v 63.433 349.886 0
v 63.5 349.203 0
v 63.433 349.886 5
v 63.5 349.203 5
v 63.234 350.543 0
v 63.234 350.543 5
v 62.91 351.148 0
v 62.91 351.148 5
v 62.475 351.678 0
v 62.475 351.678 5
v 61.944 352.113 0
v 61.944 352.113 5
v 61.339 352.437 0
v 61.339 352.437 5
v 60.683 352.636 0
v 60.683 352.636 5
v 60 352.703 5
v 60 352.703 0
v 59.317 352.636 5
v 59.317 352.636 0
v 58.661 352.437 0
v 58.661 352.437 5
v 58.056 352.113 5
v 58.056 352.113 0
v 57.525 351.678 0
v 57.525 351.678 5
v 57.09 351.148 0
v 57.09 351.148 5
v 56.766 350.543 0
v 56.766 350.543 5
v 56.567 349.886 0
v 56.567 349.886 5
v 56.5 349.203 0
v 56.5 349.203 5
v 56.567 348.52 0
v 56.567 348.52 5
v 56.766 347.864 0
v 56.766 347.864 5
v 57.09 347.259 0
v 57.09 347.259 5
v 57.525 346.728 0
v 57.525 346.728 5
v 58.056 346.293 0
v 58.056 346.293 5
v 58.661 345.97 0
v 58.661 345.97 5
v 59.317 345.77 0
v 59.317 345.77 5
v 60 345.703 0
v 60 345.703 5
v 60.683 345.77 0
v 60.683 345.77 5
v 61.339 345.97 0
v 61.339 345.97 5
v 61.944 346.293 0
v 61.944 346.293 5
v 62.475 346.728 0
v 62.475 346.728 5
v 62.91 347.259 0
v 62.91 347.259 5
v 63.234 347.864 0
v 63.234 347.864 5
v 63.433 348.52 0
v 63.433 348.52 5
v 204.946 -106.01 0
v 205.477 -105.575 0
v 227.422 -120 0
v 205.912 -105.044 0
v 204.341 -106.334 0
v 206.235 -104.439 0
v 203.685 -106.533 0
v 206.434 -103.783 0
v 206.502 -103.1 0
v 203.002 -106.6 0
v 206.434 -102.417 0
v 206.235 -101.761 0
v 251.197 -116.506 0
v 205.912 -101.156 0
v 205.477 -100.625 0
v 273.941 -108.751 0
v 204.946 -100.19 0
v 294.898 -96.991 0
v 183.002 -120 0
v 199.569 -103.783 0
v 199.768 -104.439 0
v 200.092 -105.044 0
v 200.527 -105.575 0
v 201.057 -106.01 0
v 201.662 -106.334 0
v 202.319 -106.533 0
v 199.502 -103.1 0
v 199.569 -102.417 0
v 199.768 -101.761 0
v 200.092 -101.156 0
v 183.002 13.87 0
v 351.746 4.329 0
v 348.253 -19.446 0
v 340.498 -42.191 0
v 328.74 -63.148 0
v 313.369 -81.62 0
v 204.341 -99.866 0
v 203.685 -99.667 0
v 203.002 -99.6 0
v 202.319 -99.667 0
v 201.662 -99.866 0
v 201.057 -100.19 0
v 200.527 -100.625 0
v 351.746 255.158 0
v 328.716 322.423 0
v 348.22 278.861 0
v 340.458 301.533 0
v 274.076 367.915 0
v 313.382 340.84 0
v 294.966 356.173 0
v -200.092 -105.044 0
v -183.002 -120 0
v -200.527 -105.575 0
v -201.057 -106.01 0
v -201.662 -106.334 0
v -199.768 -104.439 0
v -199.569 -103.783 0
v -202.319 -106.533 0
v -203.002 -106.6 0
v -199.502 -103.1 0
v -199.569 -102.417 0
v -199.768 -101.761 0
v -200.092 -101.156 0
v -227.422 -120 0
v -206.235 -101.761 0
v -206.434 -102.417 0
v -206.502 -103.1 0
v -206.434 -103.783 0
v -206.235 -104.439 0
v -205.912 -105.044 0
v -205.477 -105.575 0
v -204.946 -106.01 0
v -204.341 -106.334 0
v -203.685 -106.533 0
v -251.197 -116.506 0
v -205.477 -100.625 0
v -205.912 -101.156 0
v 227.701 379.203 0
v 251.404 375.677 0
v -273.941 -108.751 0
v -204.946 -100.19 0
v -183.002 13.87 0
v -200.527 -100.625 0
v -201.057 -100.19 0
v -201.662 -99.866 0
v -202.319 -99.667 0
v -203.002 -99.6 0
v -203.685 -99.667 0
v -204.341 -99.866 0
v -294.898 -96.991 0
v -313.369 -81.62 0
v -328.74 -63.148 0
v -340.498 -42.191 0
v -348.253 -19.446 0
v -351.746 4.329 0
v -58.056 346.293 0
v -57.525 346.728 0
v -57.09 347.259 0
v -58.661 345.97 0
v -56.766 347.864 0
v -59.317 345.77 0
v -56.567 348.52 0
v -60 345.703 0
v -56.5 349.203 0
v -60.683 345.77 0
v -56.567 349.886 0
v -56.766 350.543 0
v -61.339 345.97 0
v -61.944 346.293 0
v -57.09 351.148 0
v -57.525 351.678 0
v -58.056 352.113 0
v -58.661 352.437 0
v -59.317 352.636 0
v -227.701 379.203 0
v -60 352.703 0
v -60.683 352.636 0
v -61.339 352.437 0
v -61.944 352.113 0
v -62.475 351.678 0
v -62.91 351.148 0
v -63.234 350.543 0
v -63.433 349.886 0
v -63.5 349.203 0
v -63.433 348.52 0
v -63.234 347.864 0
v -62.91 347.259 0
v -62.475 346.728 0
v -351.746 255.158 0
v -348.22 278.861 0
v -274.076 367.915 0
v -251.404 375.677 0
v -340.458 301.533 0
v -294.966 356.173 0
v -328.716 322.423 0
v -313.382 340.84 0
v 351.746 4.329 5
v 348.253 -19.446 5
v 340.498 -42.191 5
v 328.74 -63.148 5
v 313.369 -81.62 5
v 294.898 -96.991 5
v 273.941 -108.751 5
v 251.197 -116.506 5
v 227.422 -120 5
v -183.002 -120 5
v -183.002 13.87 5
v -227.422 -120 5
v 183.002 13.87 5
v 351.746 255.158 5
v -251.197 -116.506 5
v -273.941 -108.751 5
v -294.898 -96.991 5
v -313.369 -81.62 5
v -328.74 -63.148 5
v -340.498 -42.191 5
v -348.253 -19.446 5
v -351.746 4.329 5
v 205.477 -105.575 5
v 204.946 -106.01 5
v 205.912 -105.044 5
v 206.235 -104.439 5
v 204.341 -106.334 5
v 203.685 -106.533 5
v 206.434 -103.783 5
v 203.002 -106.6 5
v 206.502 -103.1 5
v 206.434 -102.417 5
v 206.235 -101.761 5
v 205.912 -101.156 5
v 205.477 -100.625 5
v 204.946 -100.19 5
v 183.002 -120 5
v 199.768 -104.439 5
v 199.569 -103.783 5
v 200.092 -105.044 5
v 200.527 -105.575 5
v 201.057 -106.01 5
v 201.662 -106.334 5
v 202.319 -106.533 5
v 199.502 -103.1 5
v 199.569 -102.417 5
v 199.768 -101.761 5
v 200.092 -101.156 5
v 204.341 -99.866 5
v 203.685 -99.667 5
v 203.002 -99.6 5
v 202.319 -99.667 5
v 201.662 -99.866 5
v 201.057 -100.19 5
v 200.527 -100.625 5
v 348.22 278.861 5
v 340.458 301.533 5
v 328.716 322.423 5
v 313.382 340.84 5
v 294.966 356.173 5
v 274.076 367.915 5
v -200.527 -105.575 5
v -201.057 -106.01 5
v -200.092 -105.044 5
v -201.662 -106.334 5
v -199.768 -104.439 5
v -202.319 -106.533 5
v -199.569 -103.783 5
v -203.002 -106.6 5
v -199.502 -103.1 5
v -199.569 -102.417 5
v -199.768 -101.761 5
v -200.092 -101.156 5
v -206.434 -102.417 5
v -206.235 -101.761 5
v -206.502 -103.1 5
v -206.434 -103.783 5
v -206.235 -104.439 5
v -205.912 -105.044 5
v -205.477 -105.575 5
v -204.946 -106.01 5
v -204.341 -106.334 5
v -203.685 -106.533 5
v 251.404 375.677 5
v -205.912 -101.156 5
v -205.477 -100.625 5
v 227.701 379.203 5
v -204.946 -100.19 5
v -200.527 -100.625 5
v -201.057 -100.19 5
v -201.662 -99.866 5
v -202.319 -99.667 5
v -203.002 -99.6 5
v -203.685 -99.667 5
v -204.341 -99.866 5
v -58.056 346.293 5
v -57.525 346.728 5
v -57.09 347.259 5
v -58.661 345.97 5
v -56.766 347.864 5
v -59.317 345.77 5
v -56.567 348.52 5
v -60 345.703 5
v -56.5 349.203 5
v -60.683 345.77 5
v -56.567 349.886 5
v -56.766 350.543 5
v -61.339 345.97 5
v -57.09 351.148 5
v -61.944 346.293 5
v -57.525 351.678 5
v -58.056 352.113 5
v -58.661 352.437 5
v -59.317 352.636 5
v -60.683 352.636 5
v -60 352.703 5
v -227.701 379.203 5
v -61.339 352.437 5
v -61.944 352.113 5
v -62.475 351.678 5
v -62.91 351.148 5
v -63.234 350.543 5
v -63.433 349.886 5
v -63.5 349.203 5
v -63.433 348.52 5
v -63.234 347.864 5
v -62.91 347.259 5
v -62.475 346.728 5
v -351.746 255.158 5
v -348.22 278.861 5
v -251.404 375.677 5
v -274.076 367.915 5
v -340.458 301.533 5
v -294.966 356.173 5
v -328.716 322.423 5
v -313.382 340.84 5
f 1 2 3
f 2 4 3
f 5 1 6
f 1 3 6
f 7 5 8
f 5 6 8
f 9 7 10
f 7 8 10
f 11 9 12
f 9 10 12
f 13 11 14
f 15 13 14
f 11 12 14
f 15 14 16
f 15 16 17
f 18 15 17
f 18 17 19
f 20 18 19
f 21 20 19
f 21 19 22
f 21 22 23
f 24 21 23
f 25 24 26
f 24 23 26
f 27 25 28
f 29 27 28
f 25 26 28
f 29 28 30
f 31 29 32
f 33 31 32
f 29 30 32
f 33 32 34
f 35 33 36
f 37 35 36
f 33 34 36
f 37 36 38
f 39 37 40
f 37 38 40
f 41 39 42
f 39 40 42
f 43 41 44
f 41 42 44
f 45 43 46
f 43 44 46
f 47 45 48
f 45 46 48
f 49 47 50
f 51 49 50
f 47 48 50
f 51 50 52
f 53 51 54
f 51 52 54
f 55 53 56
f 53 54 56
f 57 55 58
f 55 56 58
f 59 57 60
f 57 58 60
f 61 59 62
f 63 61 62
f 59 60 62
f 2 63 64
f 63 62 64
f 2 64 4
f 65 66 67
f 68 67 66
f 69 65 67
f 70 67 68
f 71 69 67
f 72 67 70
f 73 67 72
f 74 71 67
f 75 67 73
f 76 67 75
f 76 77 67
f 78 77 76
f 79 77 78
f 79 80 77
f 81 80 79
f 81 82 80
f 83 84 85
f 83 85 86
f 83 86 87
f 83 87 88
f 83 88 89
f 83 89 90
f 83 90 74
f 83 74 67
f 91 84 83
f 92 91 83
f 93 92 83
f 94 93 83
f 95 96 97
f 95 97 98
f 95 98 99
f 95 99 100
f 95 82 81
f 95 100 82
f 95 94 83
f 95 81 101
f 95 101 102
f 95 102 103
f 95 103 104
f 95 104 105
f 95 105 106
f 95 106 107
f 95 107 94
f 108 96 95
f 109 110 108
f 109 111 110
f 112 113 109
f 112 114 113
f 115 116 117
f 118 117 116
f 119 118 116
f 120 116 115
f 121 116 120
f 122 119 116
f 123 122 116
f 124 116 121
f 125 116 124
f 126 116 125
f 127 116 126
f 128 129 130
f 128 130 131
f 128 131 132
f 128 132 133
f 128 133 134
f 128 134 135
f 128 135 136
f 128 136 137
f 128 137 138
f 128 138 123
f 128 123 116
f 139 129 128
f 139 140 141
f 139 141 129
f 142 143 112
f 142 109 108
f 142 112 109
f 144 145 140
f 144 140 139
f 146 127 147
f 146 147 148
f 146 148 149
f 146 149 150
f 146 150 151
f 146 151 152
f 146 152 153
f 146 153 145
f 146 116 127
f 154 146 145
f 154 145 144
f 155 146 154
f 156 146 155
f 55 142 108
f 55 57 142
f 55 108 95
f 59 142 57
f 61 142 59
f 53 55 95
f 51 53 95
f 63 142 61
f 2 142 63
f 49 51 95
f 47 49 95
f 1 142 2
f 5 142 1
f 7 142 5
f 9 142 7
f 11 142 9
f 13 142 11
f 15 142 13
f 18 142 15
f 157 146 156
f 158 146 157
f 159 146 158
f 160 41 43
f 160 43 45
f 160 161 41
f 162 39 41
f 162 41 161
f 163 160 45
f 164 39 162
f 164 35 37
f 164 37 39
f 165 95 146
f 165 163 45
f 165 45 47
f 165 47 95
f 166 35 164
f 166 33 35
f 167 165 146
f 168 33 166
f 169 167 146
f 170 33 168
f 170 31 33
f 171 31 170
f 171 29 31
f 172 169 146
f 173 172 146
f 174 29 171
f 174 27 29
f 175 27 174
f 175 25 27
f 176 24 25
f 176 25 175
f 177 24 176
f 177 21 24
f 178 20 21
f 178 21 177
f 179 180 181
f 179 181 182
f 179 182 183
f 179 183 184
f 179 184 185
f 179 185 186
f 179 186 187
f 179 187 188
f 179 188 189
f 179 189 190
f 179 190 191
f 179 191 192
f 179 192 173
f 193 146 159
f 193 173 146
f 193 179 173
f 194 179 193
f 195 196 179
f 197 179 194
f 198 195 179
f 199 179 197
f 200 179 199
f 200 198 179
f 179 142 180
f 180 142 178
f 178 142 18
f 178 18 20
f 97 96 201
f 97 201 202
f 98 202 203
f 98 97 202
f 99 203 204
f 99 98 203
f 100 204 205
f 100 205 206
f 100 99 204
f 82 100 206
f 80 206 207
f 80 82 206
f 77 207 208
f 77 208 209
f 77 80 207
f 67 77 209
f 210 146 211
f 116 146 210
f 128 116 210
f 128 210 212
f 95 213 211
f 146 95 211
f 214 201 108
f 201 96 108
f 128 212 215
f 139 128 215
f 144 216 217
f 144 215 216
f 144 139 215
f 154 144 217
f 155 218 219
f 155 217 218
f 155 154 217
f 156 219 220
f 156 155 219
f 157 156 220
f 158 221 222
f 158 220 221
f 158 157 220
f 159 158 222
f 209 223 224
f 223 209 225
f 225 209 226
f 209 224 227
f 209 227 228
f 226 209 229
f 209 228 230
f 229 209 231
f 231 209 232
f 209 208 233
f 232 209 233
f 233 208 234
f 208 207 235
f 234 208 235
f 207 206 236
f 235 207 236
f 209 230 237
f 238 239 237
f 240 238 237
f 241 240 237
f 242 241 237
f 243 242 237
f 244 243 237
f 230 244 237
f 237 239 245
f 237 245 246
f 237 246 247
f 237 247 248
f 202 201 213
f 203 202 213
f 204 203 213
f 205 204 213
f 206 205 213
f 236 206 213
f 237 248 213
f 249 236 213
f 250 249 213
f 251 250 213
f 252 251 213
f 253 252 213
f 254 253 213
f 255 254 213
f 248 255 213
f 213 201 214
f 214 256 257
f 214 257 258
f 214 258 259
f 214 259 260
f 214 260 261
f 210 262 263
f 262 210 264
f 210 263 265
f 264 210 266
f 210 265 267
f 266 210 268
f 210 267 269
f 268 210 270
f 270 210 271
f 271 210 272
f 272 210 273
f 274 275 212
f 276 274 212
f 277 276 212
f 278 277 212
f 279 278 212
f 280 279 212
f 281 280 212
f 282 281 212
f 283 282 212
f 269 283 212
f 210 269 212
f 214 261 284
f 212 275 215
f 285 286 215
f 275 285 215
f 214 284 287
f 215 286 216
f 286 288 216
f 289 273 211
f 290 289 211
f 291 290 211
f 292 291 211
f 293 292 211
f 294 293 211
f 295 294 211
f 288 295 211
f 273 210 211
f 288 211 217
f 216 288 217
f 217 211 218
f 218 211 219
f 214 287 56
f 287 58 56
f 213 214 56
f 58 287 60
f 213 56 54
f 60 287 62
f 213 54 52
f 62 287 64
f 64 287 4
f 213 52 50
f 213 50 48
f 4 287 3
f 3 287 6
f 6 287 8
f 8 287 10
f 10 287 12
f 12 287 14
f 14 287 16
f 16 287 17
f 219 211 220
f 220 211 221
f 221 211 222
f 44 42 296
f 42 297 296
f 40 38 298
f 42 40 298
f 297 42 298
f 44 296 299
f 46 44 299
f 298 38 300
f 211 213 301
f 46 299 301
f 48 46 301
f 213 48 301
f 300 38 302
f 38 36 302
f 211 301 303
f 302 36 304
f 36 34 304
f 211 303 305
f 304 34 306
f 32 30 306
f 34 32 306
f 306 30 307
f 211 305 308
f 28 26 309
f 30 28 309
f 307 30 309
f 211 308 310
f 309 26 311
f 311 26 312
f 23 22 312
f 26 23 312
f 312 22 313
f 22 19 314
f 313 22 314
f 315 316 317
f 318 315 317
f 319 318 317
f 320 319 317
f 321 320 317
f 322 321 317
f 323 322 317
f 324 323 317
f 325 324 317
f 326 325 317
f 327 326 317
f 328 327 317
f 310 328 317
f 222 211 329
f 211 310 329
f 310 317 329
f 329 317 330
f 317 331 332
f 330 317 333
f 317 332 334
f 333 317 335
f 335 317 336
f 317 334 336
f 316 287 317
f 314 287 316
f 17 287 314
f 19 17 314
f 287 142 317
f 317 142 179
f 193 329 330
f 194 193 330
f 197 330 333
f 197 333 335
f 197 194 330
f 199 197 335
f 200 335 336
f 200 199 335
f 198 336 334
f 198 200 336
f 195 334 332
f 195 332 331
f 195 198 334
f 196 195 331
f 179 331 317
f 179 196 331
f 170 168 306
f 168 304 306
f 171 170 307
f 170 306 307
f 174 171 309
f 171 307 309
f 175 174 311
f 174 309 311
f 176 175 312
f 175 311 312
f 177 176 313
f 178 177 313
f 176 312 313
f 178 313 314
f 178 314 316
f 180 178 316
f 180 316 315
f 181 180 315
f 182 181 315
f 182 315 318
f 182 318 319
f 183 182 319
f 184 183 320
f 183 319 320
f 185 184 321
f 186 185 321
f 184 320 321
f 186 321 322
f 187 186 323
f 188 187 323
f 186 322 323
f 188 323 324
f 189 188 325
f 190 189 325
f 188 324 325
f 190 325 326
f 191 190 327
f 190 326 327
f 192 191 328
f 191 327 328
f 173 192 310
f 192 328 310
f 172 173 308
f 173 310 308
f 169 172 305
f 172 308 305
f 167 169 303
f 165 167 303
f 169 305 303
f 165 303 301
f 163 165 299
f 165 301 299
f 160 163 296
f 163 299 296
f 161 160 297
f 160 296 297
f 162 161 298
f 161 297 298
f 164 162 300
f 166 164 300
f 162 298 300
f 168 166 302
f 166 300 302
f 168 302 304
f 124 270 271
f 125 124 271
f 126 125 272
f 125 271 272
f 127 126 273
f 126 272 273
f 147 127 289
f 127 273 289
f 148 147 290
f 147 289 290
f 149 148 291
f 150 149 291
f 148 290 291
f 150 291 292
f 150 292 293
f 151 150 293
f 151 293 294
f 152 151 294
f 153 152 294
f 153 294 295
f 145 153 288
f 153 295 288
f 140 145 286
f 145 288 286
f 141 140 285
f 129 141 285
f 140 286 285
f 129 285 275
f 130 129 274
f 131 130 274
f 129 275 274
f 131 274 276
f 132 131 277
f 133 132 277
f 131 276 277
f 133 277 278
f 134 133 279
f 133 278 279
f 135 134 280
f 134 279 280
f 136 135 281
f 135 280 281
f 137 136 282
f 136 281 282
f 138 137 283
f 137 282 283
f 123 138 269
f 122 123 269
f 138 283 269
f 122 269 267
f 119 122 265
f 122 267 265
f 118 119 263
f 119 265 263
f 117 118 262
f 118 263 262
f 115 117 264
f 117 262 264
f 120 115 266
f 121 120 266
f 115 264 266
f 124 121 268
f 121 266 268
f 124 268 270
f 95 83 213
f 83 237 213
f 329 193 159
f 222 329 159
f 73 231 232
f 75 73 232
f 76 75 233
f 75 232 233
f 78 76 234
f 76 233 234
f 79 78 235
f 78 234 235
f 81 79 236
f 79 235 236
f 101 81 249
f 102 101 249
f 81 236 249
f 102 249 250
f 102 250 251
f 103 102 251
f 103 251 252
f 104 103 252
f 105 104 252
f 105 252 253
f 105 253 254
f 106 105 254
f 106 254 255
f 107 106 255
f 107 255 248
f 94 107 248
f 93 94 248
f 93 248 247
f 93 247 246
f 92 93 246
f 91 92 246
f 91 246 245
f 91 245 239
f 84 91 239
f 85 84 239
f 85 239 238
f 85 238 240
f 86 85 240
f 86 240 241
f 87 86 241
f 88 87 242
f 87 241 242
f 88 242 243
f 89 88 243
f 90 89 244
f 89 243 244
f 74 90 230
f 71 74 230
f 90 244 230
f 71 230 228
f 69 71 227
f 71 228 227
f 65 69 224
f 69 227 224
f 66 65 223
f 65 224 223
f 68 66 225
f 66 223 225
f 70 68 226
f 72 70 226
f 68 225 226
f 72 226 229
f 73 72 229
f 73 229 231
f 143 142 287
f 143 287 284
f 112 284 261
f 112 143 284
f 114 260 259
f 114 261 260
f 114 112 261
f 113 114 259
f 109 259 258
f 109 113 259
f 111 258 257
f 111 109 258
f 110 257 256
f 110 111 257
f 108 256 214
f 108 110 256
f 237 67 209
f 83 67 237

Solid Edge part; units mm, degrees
sketch "Sketch1" plane through (0, 0, 0) normal (0, 0, 1) x (1, 0, 0)
  line L0 (-183.0017, -120) -> (-227.4217, -120)
  line L1 (-289.5811, -57.8353) -> (-227.4217, -120)
  line L2 (-289.5811, -57.8353) -> (-351.7458, 4.3295)
  line L3 (-351.7458, 129.7437) -> (-351.7458, 4.3295)
  line L4 (-351.7458, 129.7437) -> (-351.7458, 255.1579)
  line L5 (-289.4346, 317.4691) -> (-351.7458, 255.1579)
  line L6 (-289.4346, 317.4691) -> (-227.7006, 379.2031)
  line L7 (0, 379.2031) -> (-227.7006, 379.2031)
  line L8 (0, 379.2031) -> (0, 0)
  line L9 (0, 0) -> (-183.0017, 0)
  line L10 (-183.0017, 0) -> (-183.0017, -120)
  dimension "D1" = 351.7458
  dimension "D2" = 227.7006
  dimension "D3" = 120
  dimension "D4" = 44.42
  dimension "D5" = 87.3051
  dimension "D6" = 88.1213
  dimension "D7" = 125.4142
  dimension "D8" = 125.4142
  dimension "D9" = 87.9142
  dimension "D10" = 87.9104
  dimension "D11" = 499.2031
extrude "Protrusion1" add sketch "Sketch1" along normal blind 5
mirror "Mirror1" about plane through (0, 0, 0) normal (1, 0, 0) of "Protrusion1"
sketch "Sketch2" plane through (0, 149.6016, 0) normal (0, 0, -1) x (-1, 0, 0)
  line L0 (-351.7458, -111.1142) -> (-193.1203, -269.6016)
  line L1 (-193.1203, -269.6016) -> (-227.4217, -269.6016)
  arc A0 (-351.7458, -145.2721) -> (-227.4217, -269.6016) centre (-220.2414, -138.0974) ccw
  line L2 (-351.7458, -111.1142) -> (-351.7458, -145.2721)
  dimension "D1" = 131.7
extrude "Protrusion2" add sketch "Sketch2" against normal up to vertex (5 mm away)
sketch "Sketch3" plane through (0, 149.6016, 0) normal (0, 0, -1) x (-1, 0, 0)
  line L0 (-227.7006, 229.6016) -> (-351.7458, 105.5563)
  arc A0 (-351.7458, 105.5563) -> (-227.7006, 229.6016) centre (-220.2564, 98.1121) cw
extrude "Protrusion3" add sketch "Sketch3" against normal up to vertex (5 mm away)
mirror "Mirror2" about plane through (0, 0, 0) normal (1, 0, 0) of "Protrusion3", "Protrusion2"
sketch "Sketch4" plane through (0, 0, 2.5) normal (0, -1, 0) x (1, 0, 0)
  line L0 (-183.0017, 2.5) -> (183.0017, 2.5)
  line L1 (183.0017, 2.5) -> (183.0017, -2.5)
  line L2 (183.0017, -2.5) -> (-183.0017, -2.5)
  line L3 (-183.0017, -2.5) -> (-183.0017, 2.5)
extrude "Protrusion6" add sketch "Sketch4" along normal blind 1.13
sketch "Sketch5" plane through (0, 129.6016, 5) normal (0, 0, 1) x (1, 0, 0)
  line L0 (-183.0017, -130.7316) -> (183.0017, -130.7316)
  line L1 (183.0017, -130.7316) -> (183.0017, -115.7316)
  line L2 (183.0017, -115.7316) -> (-183.0017, -115.7316)
  line L3 (-183.0017, -115.7316) -> (-183.0017, -130.7316)
  dimension "D1" = 15
extrude "Cutout1" cut sketch "Sketch5" against normal through all
sketch "Sketch6" plane through (0, 129.6016, 5) normal (0, 0, 1) x (1, 0, 0)
  circle A0 centre (-203.0017, -232.7016) radius 3.5
  circle A1 centre (203.0017, -232.7016) radius 3.5
  dimension "D1" = 7
  dimension "D2" = 20
  dimension "D3" = 16.9
extrude "Cutout2" cut sketch "Sketch6" against normal through all
sketch "Sketch7" plane through (0, 129.6016, 5) normal (0, 0, 1) x (1, 0, 0)
  circle A0 centre (-60, 219.6016) radius 3.5
  circle A1 centre (60, 219.6016) radius 3.5
  dimension "D1" = 120
  dimension "D2" = 7
  dimension "D3" = 30
extrude "Cutout3" cut sketch "Sketch7" against normal through all
properties material "ABS-Plastik, mittelfest"
